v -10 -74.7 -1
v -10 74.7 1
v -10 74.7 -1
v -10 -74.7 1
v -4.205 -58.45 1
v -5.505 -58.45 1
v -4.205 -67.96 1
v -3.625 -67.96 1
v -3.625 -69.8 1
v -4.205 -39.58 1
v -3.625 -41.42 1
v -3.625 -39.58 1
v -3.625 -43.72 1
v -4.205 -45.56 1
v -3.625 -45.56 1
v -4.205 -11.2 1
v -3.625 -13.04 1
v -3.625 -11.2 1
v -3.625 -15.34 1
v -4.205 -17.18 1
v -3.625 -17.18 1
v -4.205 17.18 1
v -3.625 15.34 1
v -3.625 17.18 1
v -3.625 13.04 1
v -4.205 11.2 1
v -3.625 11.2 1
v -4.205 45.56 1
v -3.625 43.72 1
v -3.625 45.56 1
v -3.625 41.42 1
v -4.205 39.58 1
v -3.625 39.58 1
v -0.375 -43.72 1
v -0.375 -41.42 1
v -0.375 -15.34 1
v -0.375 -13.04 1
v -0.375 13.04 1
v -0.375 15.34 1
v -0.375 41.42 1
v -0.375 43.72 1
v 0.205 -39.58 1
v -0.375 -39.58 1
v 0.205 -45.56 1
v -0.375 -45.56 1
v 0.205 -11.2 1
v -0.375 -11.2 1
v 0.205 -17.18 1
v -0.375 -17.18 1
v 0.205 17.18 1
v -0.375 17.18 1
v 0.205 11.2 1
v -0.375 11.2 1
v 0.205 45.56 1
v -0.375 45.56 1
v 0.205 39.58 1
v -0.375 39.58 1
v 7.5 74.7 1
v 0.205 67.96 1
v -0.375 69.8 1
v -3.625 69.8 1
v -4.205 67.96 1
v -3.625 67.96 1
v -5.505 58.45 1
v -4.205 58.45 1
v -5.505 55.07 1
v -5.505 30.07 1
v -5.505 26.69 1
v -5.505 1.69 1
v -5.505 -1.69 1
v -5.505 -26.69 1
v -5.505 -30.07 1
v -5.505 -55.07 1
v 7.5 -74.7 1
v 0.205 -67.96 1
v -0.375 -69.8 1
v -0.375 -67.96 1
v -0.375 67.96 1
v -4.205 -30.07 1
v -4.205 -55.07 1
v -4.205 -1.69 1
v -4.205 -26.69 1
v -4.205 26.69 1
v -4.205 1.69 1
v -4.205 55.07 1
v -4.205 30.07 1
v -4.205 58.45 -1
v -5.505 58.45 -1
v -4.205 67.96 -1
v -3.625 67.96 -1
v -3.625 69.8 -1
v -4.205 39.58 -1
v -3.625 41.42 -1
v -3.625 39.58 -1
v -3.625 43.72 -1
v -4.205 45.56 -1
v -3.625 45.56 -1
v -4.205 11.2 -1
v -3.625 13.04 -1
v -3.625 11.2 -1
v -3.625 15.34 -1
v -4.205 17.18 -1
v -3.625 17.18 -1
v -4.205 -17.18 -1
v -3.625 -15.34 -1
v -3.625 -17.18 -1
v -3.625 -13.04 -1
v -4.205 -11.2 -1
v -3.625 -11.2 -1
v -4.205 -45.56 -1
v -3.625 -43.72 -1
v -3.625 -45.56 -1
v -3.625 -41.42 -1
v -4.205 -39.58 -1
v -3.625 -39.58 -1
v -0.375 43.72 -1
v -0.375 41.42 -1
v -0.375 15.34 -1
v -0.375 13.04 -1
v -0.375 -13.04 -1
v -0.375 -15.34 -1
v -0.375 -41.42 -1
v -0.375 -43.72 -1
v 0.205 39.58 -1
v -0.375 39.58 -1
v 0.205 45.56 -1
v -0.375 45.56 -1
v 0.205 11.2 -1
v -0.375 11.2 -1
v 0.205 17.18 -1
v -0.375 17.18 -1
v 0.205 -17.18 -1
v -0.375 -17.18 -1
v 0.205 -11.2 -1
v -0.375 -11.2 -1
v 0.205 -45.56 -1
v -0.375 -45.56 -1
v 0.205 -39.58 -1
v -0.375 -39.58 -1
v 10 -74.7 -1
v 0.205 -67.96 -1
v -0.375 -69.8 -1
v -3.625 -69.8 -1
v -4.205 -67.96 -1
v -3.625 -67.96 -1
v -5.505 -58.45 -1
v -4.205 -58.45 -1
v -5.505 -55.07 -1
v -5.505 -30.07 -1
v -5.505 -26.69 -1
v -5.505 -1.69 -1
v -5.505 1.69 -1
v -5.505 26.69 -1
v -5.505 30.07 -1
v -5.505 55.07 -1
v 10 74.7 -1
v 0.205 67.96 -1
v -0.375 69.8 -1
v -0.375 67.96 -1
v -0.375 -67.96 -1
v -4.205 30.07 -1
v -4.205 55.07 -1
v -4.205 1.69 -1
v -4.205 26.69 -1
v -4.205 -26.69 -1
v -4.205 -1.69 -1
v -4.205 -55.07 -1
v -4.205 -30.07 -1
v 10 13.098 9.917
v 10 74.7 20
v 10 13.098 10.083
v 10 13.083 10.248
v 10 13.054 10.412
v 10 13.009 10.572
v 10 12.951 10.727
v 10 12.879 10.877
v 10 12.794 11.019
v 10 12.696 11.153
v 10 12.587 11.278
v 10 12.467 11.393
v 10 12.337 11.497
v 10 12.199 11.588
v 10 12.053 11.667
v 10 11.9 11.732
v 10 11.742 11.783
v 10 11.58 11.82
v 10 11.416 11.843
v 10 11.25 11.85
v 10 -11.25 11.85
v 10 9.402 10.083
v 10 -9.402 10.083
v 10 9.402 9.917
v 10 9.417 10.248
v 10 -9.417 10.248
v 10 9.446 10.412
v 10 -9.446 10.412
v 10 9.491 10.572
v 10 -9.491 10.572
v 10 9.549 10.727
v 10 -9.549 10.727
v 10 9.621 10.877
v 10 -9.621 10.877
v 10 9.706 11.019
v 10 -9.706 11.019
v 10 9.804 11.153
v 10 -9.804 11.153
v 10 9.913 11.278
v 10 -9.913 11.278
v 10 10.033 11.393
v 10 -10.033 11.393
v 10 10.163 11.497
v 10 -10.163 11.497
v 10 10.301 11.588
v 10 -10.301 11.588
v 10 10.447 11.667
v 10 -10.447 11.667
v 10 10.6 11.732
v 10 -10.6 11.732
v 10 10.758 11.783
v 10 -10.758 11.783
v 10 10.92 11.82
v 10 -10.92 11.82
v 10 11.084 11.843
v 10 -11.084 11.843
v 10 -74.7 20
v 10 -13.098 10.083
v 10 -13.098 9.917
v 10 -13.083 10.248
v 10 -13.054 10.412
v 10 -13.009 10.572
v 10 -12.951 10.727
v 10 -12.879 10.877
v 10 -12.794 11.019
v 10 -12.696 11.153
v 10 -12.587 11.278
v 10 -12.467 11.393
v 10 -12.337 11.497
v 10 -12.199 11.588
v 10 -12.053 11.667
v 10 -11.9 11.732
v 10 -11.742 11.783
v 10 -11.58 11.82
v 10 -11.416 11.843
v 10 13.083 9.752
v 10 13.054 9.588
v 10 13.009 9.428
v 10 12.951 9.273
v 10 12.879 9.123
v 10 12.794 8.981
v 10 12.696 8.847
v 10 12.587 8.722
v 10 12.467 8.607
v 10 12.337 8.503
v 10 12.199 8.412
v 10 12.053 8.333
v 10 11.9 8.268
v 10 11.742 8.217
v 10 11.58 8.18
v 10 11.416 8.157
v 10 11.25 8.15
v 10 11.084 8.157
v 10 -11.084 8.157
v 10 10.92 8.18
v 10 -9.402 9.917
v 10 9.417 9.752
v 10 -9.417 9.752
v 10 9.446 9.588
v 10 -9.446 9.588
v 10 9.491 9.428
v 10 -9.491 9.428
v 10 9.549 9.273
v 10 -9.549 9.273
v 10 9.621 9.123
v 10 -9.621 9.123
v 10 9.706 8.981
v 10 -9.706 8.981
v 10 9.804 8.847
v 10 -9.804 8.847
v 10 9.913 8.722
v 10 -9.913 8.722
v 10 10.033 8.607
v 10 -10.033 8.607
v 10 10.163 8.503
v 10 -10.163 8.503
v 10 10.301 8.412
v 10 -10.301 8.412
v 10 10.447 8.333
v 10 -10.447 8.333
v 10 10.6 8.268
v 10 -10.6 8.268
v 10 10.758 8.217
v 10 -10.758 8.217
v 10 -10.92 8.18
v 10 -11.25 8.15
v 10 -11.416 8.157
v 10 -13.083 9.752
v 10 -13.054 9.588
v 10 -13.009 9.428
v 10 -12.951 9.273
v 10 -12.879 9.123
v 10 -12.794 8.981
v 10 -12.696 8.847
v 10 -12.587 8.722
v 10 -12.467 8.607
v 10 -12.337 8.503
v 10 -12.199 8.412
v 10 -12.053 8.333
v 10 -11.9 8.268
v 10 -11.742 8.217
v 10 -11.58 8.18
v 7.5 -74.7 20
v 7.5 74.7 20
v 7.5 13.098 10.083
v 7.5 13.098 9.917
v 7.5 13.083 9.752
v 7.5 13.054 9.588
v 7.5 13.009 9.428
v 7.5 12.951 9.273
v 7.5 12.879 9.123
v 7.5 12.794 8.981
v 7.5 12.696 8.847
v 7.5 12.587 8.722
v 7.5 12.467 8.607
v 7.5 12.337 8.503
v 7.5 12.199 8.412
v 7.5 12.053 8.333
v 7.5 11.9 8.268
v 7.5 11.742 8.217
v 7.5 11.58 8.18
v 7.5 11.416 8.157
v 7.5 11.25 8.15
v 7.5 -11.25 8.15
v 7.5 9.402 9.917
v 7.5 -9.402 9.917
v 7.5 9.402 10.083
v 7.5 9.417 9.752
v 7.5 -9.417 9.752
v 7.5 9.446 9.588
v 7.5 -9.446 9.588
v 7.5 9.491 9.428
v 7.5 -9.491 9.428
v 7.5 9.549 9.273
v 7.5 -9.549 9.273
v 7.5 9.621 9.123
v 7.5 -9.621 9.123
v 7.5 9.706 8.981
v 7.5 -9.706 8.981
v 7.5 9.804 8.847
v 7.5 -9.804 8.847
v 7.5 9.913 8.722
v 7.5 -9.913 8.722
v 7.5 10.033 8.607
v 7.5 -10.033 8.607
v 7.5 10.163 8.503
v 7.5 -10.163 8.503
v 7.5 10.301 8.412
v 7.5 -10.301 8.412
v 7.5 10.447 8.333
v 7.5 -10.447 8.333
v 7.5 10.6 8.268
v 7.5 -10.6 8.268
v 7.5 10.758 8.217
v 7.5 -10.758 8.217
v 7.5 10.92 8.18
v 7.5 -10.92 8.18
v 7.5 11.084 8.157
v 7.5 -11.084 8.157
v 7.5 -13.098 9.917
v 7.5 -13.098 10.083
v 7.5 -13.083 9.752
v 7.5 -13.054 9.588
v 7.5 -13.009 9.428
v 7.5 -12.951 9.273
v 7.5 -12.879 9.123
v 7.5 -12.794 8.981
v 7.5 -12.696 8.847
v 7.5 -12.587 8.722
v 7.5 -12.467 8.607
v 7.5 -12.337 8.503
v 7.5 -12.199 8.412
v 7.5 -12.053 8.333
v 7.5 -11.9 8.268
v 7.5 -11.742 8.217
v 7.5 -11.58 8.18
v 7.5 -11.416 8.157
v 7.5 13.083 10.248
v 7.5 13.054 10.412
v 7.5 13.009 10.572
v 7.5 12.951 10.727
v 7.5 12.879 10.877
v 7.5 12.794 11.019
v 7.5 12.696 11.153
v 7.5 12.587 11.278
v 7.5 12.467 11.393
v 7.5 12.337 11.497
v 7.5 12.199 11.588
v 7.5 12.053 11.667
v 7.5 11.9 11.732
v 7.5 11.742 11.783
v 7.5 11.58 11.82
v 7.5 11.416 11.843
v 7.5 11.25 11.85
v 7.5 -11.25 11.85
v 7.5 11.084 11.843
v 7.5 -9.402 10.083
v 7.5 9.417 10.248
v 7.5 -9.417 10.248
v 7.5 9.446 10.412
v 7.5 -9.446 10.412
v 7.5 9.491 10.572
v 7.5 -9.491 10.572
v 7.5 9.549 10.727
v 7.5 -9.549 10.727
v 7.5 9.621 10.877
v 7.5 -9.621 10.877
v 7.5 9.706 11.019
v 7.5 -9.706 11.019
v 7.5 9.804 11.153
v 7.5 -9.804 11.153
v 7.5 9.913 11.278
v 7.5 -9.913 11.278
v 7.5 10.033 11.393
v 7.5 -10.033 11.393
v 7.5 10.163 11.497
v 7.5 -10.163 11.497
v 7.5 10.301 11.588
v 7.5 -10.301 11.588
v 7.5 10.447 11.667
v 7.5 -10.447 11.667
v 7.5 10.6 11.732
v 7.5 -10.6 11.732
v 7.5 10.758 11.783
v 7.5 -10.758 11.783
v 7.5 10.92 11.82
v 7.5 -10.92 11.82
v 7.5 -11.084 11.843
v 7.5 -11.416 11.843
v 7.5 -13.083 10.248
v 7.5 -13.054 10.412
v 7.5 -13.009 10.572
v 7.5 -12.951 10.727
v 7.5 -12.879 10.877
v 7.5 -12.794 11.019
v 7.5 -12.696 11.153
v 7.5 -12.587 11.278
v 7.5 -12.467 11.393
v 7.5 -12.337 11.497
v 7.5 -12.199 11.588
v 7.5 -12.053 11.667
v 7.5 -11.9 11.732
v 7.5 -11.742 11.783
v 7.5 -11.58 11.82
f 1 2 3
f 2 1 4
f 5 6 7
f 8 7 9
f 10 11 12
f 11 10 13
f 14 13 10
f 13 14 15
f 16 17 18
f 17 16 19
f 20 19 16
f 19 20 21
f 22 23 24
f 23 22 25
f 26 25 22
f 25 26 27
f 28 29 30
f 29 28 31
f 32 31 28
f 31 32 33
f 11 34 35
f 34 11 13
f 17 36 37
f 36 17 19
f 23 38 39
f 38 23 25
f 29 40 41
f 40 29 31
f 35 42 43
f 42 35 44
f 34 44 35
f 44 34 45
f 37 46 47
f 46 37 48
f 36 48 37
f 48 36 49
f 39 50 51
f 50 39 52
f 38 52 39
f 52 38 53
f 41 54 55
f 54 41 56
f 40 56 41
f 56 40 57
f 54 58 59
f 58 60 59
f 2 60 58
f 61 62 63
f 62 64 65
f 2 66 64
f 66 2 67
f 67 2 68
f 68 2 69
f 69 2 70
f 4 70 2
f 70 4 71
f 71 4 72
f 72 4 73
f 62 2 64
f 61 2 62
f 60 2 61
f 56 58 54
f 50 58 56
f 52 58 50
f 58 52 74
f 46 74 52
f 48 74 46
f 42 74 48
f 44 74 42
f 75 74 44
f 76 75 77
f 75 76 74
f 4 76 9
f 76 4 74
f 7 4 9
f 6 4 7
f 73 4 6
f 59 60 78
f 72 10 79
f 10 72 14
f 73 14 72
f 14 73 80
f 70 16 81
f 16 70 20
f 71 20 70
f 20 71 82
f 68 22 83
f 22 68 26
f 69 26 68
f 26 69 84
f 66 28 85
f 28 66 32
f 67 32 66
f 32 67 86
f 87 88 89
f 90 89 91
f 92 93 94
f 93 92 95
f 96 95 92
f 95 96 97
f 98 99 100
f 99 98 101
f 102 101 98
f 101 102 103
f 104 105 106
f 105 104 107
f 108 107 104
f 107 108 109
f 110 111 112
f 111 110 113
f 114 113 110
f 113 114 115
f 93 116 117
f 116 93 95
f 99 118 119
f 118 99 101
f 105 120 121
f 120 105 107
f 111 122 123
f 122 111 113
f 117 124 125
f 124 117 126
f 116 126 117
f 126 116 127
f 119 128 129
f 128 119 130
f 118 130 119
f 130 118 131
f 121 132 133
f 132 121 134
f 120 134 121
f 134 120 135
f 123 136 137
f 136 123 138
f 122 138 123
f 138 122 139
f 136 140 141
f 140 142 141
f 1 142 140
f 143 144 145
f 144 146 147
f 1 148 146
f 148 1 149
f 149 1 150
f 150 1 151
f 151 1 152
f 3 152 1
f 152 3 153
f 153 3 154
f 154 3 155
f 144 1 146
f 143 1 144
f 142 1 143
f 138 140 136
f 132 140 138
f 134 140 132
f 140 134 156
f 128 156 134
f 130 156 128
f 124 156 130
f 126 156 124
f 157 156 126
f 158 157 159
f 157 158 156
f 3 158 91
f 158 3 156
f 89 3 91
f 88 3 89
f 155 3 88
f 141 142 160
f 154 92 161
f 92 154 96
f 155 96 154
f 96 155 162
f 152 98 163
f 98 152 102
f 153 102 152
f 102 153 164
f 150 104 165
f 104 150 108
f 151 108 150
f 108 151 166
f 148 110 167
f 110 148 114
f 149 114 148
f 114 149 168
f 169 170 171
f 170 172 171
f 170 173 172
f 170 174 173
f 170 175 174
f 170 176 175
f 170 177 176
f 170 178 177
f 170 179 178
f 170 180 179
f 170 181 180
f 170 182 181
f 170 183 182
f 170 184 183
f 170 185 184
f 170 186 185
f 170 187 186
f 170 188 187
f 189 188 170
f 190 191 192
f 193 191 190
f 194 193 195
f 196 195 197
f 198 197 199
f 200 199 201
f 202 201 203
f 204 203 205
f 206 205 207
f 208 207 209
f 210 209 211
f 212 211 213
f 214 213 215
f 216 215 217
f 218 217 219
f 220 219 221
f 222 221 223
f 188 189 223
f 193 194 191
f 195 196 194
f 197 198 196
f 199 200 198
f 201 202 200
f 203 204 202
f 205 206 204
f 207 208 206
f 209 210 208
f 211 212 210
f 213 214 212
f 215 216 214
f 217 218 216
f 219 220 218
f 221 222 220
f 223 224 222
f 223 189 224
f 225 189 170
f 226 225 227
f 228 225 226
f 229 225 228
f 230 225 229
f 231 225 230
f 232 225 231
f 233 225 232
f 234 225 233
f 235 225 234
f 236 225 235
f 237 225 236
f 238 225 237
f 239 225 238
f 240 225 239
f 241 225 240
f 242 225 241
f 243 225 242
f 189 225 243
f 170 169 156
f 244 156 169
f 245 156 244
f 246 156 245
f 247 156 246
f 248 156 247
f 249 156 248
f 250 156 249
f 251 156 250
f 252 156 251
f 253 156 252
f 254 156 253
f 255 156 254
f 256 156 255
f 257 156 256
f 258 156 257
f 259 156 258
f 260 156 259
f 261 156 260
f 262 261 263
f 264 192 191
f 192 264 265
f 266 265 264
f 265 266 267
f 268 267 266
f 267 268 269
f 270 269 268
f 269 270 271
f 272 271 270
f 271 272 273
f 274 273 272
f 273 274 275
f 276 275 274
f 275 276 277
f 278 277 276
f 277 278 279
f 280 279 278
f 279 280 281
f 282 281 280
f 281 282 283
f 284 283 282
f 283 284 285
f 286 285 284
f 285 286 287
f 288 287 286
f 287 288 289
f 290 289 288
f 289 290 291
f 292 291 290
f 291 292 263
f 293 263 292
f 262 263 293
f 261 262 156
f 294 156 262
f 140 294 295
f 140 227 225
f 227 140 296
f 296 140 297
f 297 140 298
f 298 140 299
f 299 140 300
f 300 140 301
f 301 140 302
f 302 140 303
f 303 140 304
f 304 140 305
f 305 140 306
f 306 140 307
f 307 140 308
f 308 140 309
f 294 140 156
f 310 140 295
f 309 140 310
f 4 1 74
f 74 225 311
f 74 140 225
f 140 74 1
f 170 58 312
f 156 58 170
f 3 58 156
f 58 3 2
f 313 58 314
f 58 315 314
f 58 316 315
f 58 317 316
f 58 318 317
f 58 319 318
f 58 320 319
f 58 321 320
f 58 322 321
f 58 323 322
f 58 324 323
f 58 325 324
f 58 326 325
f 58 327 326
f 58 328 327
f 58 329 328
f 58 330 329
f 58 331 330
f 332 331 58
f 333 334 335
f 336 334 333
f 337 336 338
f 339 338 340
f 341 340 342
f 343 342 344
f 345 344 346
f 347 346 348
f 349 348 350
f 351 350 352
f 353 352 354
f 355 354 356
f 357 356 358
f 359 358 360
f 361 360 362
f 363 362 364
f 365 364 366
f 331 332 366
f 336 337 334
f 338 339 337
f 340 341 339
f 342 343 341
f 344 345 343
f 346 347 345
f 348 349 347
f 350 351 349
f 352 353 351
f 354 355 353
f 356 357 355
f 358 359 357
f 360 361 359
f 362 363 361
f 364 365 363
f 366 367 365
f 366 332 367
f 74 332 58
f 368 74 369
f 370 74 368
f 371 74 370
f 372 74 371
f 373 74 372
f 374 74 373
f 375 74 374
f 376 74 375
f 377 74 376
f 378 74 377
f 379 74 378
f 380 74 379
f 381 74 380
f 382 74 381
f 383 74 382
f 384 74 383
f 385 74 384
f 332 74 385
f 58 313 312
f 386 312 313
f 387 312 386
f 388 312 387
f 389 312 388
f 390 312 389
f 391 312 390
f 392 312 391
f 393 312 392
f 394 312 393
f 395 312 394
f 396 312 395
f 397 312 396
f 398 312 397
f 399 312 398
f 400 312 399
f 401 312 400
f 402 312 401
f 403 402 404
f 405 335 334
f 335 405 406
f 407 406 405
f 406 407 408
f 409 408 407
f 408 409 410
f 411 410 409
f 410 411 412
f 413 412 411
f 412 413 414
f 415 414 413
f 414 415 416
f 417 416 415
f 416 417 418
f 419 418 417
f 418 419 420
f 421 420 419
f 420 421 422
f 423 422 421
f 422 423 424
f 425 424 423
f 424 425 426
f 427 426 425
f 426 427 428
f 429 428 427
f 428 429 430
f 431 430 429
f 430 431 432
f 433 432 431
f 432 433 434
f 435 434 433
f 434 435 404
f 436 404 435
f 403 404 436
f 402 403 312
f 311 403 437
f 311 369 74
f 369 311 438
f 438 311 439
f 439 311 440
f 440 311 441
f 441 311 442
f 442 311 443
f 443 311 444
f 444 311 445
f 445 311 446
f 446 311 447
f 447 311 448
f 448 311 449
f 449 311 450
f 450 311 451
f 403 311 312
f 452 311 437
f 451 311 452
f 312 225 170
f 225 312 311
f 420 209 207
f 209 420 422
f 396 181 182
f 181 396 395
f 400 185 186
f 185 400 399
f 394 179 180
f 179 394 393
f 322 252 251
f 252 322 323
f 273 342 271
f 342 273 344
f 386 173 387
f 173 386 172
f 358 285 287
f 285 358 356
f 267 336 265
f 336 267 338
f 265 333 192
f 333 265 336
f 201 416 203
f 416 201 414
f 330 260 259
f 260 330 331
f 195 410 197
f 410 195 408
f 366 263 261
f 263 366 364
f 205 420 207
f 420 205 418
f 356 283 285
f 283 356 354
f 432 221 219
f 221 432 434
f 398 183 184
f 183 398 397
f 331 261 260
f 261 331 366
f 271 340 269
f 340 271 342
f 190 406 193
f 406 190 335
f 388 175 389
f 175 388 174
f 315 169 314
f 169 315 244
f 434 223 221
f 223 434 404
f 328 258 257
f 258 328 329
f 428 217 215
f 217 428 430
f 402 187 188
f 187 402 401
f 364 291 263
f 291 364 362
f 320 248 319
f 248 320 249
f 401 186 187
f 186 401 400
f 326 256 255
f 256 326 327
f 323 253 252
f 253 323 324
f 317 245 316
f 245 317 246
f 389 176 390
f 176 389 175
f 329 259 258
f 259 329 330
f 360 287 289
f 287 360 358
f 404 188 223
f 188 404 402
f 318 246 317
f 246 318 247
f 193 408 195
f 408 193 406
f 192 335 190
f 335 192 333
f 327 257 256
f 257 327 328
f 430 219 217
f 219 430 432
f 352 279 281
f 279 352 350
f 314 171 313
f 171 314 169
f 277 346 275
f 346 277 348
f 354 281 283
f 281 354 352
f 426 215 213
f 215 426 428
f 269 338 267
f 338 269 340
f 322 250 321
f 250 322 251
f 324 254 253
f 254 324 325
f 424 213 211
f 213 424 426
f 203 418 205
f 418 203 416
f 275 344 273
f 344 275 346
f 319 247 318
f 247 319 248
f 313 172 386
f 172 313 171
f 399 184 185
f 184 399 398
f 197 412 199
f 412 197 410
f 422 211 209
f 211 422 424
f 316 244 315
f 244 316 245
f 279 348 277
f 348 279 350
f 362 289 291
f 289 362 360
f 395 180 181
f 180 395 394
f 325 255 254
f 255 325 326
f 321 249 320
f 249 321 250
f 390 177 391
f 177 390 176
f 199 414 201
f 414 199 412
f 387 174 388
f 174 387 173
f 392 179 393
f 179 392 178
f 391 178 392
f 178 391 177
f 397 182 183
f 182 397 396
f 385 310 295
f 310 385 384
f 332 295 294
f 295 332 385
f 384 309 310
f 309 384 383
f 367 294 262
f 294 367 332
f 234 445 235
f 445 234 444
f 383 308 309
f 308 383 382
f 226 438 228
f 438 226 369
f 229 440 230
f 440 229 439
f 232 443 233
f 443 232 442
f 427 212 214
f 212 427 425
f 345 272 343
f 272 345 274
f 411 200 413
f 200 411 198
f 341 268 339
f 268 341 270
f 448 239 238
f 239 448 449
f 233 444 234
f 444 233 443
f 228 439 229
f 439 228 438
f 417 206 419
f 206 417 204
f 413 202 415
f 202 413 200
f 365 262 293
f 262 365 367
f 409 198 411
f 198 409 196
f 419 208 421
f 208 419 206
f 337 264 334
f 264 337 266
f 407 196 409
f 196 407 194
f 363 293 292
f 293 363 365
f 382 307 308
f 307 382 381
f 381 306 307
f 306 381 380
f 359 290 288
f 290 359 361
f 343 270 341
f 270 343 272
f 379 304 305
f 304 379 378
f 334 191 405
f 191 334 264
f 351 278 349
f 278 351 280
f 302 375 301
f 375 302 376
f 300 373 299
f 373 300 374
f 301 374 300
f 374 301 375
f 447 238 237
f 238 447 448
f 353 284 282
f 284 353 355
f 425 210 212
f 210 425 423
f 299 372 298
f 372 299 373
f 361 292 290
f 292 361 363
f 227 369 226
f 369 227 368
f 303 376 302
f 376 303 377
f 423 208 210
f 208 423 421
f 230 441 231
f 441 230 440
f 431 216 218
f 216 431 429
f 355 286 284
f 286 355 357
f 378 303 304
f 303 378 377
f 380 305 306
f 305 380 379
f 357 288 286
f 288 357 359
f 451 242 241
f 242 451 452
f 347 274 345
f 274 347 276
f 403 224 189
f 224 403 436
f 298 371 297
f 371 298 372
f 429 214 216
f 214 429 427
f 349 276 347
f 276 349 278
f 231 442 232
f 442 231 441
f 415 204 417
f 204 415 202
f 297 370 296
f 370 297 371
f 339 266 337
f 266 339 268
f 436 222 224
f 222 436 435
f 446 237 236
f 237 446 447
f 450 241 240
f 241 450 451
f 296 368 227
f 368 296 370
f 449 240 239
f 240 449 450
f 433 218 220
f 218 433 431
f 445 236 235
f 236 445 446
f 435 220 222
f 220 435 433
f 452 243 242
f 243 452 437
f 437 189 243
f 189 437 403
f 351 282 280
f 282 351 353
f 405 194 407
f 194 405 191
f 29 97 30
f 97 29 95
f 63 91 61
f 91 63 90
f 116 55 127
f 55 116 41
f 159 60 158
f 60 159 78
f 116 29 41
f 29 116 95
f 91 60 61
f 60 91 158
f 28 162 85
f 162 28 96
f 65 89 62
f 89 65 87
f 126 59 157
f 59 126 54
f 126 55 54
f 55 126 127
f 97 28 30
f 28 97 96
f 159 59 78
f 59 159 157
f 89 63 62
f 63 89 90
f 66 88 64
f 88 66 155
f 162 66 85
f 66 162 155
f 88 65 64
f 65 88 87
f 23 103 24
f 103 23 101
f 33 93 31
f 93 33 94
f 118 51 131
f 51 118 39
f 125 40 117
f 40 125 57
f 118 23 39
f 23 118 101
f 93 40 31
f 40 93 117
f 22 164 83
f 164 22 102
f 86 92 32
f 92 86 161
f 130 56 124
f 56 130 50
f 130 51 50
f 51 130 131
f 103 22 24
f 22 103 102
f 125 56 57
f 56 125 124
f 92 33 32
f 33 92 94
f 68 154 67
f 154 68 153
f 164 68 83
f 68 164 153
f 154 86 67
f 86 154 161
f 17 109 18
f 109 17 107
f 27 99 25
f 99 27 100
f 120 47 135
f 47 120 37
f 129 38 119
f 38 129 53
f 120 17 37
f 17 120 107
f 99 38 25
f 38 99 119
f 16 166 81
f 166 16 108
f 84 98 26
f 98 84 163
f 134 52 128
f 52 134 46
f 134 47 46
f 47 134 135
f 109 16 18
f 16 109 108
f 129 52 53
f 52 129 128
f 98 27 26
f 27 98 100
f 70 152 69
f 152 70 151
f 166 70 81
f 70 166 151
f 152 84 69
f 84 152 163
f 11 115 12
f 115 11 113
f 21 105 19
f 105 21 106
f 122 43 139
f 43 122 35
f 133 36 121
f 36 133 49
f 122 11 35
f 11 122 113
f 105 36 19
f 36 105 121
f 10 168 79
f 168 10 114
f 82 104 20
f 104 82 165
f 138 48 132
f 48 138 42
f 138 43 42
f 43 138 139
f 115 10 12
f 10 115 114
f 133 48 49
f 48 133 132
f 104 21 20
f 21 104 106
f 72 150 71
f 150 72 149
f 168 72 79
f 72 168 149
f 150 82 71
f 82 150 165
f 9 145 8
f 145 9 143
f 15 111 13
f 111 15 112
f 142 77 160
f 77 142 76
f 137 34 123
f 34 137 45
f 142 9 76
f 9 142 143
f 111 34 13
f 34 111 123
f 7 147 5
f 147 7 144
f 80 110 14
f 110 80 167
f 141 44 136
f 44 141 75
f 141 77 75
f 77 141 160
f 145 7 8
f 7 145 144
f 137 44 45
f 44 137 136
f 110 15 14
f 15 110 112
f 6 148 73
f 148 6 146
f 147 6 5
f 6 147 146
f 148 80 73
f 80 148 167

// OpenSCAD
upper_hole_position = 47.8;
lower_hole_position = 25.3;
hole_diam=3.5; // [3.5, 4.5, 5.5, 6.5]

panel_thickness =  2; // [1.5:2.3]
bracket_thickness = 2.5; // [2.5:10]

tolerance=0.2;//[0:0.1:1]

positions=7; //[2,3,4,5,6,7,8,9,10,11,12]
rows=1; // [1,2]
count=5; // [20]

hole_spacing = upper_hole_position - lower_hole_position;

function dim_b (p, rows) = (p / rows) * 3 + 1.20;
function dim_c (p, rows) = (p / rows) * 3 + 4.88;

echo(dim_c(positions,rows));
echo(dim_b(positions,rows));
// panel cutout dimensions
module single_pos(p = 4, rows=1, height=10, tolerance=0.2) {
    panel_width=(rows == 1 ? 4.21 : 7.11);
    clip_width=(rows==1 ? 3.05 : 4.06);
    nub_height=(rows==1 ? 5.51 : 8.71);
    nub_width=(rows==1 ? 3.18 : 1.98);

    cube([clip_width+tolerance, dim_c(p,rows)+tolerance, height], center=true);
    cube([panel_width+tolerance, dim_b(p,rows)+tolerance, height], center=true);
    color("red")translate([(nub_height+tolerance)/2 - (panel_width+tolerance)/2,0,0])cube([nub_height+tolerance, nub_width+tolerance, height], center=true);

}

rotate([0,0,180])
difference() {
    union() {
        cube([20,max(hole_spacing+20, (dim_c(positions,rows)+4)*count),panel_thickness], center=true);
        translate([-10 + (bracket_thickness/2),0,10])
        cube([bracket_thickness,max(hole_spacing+20, (dim_c(positions,rows)+4)*count),20], center=true);
    }
    rotate([0,90,0])
    translate([-10,-hole_spacing/2,-12])
    #for (sp = [0, hole_spacing]) {
        translate([0,sp,0])
        cylinder(d=hole_diam+tolerance, h=10, $fn=70);
    }
    translate([2, (count+1)*(-dim_c(positions,rows) - 2.5)/2,0])
    for (i = [1:count]) {
    translate([0,i*(dim_c(positions,rows) + 2.5),0])
        #single_pos(positions, rows=rows, tolerance=tolerance);
    }
}
